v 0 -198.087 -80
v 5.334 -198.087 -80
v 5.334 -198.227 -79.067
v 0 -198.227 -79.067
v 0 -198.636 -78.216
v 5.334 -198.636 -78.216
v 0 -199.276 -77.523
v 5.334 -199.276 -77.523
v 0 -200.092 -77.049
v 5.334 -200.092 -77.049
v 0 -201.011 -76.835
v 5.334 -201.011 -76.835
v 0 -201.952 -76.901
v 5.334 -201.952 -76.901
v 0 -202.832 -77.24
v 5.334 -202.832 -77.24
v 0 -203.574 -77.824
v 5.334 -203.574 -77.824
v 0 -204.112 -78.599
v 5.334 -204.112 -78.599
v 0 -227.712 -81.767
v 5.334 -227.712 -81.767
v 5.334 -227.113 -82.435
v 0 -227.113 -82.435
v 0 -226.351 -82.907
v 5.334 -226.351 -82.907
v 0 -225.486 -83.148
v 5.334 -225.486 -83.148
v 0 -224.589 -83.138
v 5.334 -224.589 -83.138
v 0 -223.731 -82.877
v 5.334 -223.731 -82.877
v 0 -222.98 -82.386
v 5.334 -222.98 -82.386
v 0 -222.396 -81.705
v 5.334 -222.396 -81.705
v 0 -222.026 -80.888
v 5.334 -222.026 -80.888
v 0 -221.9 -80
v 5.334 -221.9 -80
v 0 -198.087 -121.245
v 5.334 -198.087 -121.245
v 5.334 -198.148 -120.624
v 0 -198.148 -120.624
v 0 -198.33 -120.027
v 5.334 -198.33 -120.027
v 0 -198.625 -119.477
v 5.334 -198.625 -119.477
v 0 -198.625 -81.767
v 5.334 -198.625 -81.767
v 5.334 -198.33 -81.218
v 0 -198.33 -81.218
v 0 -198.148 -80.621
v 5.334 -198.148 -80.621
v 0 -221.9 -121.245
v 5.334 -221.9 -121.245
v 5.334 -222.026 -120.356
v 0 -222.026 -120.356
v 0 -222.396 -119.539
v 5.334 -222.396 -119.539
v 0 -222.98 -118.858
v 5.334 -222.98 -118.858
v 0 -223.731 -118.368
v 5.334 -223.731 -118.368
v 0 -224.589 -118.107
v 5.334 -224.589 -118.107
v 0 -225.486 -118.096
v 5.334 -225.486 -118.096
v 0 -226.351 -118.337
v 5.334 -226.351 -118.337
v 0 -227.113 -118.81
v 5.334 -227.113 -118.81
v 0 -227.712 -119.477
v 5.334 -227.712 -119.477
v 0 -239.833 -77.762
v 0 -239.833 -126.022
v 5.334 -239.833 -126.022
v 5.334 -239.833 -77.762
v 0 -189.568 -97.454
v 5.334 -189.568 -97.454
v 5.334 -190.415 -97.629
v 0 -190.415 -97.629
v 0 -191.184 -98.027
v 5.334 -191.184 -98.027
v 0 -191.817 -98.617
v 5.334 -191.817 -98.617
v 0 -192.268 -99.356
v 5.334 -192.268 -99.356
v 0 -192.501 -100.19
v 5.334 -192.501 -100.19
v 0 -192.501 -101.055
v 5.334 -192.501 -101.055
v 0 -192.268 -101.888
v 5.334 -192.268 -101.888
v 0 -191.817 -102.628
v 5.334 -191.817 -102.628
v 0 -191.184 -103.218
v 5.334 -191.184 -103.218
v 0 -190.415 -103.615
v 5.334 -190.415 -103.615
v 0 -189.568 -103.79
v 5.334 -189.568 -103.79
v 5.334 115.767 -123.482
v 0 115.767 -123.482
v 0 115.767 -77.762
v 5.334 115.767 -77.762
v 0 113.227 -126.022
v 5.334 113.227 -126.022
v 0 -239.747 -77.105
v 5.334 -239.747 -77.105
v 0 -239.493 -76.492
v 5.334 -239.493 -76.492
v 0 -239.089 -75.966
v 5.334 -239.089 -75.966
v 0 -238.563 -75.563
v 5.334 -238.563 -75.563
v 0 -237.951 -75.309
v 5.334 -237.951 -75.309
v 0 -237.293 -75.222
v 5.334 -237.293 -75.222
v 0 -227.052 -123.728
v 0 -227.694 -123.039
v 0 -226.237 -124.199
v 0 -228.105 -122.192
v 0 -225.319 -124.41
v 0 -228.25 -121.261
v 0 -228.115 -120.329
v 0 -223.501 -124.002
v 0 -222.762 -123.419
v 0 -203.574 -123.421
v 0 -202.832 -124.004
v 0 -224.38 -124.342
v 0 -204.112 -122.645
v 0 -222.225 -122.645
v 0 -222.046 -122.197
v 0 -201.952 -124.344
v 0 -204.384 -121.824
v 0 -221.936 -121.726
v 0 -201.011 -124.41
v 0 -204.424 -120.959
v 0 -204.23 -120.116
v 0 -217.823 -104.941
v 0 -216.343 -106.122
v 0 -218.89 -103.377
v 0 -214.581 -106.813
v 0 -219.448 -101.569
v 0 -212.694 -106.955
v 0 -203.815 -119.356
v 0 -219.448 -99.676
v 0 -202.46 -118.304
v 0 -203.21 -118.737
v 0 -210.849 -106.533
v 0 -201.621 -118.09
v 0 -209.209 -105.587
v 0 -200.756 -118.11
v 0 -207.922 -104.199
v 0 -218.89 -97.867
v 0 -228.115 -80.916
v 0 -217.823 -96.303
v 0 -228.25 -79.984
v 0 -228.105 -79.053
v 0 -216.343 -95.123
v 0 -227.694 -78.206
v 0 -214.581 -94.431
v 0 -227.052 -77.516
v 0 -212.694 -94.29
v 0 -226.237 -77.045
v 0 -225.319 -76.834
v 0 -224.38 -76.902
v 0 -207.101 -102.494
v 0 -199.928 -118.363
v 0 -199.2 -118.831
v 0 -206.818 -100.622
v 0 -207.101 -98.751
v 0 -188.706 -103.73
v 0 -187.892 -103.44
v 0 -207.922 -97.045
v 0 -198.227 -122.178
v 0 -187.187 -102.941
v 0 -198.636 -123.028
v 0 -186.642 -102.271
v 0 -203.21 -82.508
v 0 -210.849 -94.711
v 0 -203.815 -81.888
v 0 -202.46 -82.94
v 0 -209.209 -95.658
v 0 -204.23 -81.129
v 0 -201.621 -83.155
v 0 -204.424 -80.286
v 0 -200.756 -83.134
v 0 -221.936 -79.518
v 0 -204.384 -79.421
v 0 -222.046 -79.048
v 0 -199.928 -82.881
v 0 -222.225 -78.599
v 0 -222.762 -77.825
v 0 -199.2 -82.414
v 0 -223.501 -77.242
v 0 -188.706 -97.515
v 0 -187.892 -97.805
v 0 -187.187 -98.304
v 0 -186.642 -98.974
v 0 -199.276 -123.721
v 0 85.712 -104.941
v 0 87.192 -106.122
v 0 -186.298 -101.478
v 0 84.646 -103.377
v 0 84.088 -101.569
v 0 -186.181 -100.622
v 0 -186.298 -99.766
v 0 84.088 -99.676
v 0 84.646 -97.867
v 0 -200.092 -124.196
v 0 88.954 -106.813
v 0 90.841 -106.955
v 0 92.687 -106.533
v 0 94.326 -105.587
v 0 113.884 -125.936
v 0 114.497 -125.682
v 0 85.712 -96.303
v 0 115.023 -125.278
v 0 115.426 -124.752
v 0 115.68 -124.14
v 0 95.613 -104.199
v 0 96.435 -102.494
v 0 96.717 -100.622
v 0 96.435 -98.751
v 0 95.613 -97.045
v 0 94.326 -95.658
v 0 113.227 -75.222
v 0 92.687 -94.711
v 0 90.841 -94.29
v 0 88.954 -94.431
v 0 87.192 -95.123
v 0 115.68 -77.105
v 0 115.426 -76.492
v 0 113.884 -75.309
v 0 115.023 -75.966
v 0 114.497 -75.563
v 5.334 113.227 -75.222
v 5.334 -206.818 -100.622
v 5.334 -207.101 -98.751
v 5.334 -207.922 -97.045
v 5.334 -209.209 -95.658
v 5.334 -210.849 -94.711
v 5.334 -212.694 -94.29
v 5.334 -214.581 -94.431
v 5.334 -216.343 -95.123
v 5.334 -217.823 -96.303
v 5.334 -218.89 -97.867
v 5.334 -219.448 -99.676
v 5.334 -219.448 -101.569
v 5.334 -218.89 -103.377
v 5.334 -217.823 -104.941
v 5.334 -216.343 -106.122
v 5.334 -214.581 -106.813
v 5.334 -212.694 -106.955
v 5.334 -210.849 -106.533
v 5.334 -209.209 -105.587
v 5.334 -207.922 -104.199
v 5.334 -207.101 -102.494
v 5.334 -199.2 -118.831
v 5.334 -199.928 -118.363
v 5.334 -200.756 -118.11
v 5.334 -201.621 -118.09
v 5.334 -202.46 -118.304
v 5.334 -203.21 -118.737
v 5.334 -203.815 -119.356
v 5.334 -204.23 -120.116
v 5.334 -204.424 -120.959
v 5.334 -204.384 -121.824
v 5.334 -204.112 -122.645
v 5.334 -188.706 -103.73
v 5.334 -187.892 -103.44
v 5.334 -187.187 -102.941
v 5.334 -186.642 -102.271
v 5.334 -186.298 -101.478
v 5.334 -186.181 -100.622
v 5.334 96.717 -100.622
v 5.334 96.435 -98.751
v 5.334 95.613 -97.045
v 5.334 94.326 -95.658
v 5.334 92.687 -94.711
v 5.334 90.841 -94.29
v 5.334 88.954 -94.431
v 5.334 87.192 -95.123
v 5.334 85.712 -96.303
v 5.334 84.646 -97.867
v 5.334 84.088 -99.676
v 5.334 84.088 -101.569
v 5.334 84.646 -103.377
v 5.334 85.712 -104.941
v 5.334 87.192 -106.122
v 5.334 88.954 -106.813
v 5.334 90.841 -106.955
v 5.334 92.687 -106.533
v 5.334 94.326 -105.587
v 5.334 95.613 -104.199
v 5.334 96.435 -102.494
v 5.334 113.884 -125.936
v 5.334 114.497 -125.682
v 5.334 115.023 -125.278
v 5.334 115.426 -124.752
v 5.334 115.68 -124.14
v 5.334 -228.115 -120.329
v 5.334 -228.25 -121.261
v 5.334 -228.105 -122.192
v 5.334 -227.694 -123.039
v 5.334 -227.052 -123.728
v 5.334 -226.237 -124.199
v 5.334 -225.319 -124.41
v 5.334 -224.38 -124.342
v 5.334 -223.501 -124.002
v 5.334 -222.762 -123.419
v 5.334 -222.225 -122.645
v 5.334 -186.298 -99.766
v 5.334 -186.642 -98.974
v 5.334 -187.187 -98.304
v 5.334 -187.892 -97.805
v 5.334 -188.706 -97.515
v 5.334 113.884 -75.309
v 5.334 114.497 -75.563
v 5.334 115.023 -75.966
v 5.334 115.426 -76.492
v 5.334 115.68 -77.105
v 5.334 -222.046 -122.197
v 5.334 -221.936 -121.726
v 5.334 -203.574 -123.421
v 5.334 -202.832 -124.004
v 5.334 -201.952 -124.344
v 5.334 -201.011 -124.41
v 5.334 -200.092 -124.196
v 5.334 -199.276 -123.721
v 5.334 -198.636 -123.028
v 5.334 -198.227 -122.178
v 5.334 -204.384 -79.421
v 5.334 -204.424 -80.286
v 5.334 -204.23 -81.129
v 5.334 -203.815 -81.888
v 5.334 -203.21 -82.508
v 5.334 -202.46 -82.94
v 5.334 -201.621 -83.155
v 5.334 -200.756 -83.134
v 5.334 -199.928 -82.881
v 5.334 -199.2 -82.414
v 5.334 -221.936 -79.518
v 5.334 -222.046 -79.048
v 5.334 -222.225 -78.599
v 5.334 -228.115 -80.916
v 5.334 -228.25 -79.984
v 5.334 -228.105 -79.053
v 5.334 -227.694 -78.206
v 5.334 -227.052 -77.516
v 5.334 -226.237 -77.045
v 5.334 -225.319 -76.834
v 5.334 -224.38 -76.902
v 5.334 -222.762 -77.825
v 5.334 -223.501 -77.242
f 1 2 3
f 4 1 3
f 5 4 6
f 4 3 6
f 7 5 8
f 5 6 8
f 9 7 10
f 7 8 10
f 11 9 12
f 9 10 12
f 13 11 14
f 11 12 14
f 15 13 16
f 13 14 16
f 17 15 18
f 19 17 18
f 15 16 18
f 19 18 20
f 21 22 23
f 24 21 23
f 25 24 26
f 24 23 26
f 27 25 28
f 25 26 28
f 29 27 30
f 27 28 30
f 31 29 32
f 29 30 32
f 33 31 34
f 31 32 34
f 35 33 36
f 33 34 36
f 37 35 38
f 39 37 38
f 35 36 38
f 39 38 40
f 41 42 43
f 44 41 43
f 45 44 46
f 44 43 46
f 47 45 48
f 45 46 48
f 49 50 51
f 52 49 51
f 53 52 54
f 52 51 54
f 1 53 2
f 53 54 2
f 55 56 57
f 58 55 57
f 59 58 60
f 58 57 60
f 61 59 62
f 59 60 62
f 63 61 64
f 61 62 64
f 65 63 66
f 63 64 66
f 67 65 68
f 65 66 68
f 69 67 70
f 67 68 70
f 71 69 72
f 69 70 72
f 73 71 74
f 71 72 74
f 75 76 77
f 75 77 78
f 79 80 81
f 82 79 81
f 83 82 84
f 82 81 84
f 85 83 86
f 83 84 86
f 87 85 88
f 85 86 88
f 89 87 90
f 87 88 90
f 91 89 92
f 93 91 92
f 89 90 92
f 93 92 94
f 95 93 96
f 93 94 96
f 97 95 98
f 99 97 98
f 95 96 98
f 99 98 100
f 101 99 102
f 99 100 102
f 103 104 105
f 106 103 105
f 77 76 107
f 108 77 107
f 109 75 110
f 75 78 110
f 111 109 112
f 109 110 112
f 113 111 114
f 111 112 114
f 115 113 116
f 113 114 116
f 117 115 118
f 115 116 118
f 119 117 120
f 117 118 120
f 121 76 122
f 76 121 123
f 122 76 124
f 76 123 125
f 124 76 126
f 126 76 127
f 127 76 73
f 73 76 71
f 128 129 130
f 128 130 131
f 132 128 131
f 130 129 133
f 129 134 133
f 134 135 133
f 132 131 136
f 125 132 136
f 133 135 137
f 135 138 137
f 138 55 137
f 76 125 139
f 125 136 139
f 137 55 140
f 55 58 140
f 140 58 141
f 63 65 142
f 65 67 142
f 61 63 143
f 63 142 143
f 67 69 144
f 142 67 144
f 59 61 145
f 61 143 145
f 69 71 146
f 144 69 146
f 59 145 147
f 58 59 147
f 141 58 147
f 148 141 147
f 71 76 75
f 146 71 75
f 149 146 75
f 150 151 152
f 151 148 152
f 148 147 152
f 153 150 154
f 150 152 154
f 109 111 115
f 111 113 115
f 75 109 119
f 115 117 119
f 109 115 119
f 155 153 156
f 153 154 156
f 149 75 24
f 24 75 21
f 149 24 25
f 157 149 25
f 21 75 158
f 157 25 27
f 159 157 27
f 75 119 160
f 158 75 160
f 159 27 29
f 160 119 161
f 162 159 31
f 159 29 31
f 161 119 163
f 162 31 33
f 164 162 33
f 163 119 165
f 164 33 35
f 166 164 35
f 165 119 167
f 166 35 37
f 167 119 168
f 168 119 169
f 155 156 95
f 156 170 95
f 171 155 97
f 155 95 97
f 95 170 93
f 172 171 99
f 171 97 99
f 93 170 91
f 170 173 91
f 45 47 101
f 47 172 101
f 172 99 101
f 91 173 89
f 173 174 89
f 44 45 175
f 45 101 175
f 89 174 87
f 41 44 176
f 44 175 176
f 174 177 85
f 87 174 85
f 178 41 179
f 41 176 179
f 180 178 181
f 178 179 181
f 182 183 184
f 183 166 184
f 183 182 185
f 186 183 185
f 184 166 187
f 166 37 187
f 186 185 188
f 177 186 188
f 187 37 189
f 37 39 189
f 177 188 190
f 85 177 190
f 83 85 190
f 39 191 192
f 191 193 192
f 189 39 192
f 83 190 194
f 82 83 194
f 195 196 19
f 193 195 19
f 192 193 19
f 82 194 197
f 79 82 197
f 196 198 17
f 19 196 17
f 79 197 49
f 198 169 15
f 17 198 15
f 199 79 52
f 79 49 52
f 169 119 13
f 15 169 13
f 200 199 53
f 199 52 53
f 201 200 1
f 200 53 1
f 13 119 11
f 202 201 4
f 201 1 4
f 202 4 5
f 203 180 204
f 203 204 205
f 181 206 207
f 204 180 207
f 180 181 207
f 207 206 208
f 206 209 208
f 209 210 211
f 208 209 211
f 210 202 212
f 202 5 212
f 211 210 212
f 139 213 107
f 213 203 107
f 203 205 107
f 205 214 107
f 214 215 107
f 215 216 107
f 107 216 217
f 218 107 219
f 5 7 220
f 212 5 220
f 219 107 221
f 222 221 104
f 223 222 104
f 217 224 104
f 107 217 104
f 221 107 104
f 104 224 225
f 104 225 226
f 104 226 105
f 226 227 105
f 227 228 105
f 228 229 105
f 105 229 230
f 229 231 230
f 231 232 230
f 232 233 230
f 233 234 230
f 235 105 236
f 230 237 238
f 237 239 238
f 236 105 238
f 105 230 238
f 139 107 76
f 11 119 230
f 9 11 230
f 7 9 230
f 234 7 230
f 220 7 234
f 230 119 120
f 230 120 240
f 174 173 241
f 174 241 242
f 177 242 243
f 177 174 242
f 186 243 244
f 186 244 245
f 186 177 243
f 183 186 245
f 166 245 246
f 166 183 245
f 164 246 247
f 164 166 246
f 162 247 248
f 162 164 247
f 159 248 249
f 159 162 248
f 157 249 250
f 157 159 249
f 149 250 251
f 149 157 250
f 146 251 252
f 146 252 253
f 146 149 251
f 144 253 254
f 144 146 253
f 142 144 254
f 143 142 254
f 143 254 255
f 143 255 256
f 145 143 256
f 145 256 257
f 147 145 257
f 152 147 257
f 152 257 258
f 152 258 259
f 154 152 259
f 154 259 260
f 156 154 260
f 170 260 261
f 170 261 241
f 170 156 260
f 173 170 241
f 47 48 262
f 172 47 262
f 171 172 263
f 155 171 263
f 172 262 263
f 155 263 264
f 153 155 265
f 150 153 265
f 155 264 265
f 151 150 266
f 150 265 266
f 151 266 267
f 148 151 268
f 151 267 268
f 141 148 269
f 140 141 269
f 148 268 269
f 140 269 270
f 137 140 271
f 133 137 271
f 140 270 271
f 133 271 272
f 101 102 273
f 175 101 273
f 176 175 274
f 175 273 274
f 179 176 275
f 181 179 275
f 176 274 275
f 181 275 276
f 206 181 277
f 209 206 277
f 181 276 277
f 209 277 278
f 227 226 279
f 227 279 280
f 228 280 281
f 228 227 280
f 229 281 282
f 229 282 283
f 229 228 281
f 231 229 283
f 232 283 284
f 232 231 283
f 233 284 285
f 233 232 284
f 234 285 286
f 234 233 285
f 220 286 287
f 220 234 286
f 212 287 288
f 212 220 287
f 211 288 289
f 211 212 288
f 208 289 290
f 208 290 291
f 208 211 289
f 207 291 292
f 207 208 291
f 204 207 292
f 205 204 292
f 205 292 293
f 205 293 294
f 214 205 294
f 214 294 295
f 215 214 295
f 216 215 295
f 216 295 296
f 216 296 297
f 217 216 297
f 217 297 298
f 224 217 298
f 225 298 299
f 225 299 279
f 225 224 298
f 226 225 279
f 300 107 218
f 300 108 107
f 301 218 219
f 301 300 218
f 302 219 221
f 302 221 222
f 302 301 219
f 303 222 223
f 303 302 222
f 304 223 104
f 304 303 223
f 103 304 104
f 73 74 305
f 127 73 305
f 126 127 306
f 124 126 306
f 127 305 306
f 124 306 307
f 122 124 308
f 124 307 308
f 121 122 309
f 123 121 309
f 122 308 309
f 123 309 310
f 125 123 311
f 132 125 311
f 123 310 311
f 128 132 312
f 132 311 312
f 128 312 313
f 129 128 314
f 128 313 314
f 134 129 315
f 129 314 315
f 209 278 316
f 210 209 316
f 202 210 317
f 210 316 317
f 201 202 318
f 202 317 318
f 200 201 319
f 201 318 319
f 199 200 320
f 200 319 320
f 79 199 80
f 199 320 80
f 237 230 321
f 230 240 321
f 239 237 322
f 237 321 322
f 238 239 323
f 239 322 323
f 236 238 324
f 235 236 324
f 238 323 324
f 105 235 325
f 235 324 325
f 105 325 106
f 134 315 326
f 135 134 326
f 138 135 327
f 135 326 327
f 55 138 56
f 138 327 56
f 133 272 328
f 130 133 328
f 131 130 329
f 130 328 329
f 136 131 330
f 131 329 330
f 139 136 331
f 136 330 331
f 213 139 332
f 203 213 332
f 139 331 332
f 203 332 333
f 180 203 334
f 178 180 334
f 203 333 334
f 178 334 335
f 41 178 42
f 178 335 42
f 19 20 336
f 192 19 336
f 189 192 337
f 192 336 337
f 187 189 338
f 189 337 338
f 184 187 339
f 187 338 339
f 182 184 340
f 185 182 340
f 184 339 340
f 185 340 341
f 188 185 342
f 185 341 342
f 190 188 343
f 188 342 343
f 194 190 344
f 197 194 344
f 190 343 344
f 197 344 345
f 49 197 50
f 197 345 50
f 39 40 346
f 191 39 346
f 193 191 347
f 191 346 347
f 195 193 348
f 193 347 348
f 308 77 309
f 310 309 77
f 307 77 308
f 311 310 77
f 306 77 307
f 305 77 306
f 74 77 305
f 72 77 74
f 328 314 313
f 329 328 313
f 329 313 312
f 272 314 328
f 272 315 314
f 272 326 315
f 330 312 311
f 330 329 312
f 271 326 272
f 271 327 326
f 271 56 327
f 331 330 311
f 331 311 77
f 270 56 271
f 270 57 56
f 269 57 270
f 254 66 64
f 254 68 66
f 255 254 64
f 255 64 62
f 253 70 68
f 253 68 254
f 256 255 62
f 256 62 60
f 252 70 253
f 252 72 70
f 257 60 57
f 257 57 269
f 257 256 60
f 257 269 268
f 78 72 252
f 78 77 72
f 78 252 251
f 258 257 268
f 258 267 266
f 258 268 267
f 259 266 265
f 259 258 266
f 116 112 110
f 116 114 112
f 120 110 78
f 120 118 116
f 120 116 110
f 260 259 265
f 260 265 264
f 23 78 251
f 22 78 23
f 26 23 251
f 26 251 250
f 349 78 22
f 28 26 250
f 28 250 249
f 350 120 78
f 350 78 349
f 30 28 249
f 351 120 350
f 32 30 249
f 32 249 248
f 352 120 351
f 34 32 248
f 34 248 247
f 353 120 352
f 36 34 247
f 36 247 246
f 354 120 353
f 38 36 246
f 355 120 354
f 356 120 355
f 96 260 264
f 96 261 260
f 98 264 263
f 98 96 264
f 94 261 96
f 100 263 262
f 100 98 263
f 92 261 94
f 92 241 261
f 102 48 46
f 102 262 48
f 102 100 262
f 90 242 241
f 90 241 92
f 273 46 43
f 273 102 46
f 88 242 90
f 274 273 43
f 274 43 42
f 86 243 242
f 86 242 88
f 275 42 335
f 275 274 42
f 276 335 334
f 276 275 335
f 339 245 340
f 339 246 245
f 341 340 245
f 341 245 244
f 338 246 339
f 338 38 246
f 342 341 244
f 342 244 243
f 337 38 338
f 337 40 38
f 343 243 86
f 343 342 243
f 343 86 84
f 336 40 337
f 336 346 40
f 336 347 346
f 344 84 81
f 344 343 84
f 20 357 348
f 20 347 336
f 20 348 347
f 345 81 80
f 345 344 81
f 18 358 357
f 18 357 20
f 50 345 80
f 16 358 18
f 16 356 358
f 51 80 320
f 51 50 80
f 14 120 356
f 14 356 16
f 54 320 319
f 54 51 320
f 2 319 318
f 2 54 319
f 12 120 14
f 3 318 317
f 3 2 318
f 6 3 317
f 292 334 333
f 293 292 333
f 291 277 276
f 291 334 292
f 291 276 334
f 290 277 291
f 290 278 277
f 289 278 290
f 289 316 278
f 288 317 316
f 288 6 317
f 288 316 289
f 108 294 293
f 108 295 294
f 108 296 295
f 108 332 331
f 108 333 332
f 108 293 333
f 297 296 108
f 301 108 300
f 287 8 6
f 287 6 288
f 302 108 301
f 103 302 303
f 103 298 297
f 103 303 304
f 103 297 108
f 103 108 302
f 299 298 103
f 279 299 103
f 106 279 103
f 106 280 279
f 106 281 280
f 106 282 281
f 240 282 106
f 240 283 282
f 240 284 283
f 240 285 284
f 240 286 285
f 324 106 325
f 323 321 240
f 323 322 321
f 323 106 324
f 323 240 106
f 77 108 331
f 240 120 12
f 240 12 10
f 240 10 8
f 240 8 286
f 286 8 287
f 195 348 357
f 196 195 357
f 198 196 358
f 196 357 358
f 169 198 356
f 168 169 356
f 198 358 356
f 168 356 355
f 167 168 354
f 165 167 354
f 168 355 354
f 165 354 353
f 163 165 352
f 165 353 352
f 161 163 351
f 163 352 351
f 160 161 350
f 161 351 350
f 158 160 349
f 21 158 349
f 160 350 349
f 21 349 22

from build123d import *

# Parameters (mm, degrees)
F0_W     = 355.6
F0_H     = 50.8
F0_R     = 6.35
F1_DEPTH = 5.334
F2_R     = 2.54
F4_DEPTH = 25.4


with BuildPart() as f1:
    # F0 (on Right) → F1 (new body)
    with BuildSketch(Plane.YZ):
        with Locations((-62.0332211256, -100.6222862377)):
            Rectangle(F0_W, F0_H)
        with Locations((-213.1684422493, -100.6222862377)):
            Circle(F0_R, mode=Mode.SUBTRACT)
        with Locations((90.3667788744, -100.6222862377)):
            Circle(F0_R, mode=Mode.SUBTRACT)
    extrude(amount=F1_DEPTH)

    # F2
    f2_edges = [f1.edges().sort_by_distance(p)[0] for p in [
        (2.667, 115.766779, -126.022286),
        (2.667, 115.766779, -75.222286),
        (2.667, -239.833221, -75.222286),
    ]]
    fillet(f2_edges, radius=F2_R)

    # F3 (on face) → F4 (cut)
    with BuildSketch(Plane.YZ.offset(5.334)):
        with BuildLine():
            ThreePointArc((-204.111539145, -78.5993967268), (-201.2621922493, -80.0000563101), (-198.6245120203, -81.7673333143))
            ThreePointArc((-198.6245120203, -81.7673333143), (-198.2244908381, -80.9236336682), (-198.0871922493, -80.0000563101))
            ThreePointArc((-198.0871922493, -80.0000563101), (-200.5431829982, -76.9075410398), (-204.111539145, -78.5993967268))
        make_face()
        with BuildLine():
            ThreePointArc((-227.7123724783, -81.7673333143), (-225.0746922493, -80.0000563101), (-222.2253453536, -78.5993967268))
            ThreePointArc((-222.2253453536, -78.5993967268), (-226.6621922493, -77.2504256531), (-227.7123724783, -81.7673333143))
        make_face()
        with BuildLine():
            ThreePointArc((-221.8996922493, -80.0000563101), (-221.982176979, -79.281047059), (-222.2253453536, -78.5993967268))
            ThreePointArc((-222.2253453536, -78.5993967268), (-225.0746922493, -80.0000563101), (-227.7123724783, -81.7673333143))
            ThreePointArc((-227.7123724783, -81.7673333143), (-224.1511148912, -83.0377577213), (-221.8996922493, -80.0000563101))
        make_face()
        with BuildLine():
            ThreePointArc((-204.111539145, -78.5993967268), (-202.8496922493, -82.7496869671), (-198.6245120203, -81.7673333143))
            ThreePointArc((-198.6245120203, -81.7673333143), (-201.2621922493, -80.0000563101), (-204.111539145, -78.5993967268))
        make_face()
        with BuildLine():
            ThreePointArc((-189.567608916, -103.7902228252), (-189.4089178433, -102.2097862377), (-189.3559422493, -100.6222862377))
            ThreePointArc((-189.3559422493, -100.6222862377), (-189.4089178433, -99.0347862377), (-189.567608916, -97.4543496502))
            ThreePointArc((-189.567608916, -97.4543496502), (-192.5309422493, -100.6222862377), (-189.567608916, -103.7902228252))
        make_face()
        with BuildLine():
            ThreePointArc((-189.567608916, -97.4543496502), (-189.4089178433, -99.0347862377), (-189.3559422493, -100.6222862377))
            ThreePointArc((-189.3559422493, -100.6222862377), (-189.4089178433, -102.2097862377), (-189.567608916, -103.7902228252))
            ThreePointArc((-189.567608916, -103.7902228252), (-187.1870043372, -102.9409783978), (-186.1809422493, -100.6222862377))
            ThreePointArc((-186.1809422493, -100.6222862377), (-187.1870043372, -98.3035940776), (-189.567608916, -97.4543496502))
        make_face()
        with BuildLine():
            ThreePointArc((-198.0871922493, -121.2445161653), (-198.2244908381, -120.3209388072), (-198.6245120203, -119.4772391611))
            ThreePointArc((-198.6245120203, -119.4772391611), (-201.2621922493, -121.2445161653), (-204.111539145, -122.6451757486))
            ThreePointArc((-204.111539145, -122.6451757486), (-200.5431829982, -124.3370314356), (-198.0871922493, -121.2445161653))
        make_face()
        with BuildLine():
            ThreePointArc((-204.111539145, -122.6451757486), (-201.2621922493, -121.2445161653), (-198.6245120203, -119.4772391611))
            ThreePointArc((-198.6245120203, -119.4772391611), (-202.8496922493, -118.4948855083), (-204.111539145, -122.6451757486))
        make_face()
        with BuildLine():
            ThreePointArc((-227.7123724783, -119.4772391611), (-226.6621922493, -123.9941468223), (-222.2253453536, -122.6451757486))
            ThreePointArc((-222.2253453536, -122.6451757486), (-225.0746922493, -121.2445161653), (-227.7123724783, -119.4772391611))
        make_face()
        with BuildLine():
            ThreePointArc((-227.7123724783, -119.4772391611), (-225.0746922493, -121.2445161653), (-222.2253453536, -122.6451757486))
            ThreePointArc((-222.2253453536, -122.6451757486), (-221.982176979, -121.9635254164), (-221.8996922493, -121.2445161653))
            ThreePointArc((-221.8996922493, -121.2445161653), (-224.1511148912, -118.2068147541), (-227.7123724783, -119.4772391611))
        make_face()
    extrude(amount=-F4_DEPTH, mode=Mode.SUBTRACT)


solid = f1.part
